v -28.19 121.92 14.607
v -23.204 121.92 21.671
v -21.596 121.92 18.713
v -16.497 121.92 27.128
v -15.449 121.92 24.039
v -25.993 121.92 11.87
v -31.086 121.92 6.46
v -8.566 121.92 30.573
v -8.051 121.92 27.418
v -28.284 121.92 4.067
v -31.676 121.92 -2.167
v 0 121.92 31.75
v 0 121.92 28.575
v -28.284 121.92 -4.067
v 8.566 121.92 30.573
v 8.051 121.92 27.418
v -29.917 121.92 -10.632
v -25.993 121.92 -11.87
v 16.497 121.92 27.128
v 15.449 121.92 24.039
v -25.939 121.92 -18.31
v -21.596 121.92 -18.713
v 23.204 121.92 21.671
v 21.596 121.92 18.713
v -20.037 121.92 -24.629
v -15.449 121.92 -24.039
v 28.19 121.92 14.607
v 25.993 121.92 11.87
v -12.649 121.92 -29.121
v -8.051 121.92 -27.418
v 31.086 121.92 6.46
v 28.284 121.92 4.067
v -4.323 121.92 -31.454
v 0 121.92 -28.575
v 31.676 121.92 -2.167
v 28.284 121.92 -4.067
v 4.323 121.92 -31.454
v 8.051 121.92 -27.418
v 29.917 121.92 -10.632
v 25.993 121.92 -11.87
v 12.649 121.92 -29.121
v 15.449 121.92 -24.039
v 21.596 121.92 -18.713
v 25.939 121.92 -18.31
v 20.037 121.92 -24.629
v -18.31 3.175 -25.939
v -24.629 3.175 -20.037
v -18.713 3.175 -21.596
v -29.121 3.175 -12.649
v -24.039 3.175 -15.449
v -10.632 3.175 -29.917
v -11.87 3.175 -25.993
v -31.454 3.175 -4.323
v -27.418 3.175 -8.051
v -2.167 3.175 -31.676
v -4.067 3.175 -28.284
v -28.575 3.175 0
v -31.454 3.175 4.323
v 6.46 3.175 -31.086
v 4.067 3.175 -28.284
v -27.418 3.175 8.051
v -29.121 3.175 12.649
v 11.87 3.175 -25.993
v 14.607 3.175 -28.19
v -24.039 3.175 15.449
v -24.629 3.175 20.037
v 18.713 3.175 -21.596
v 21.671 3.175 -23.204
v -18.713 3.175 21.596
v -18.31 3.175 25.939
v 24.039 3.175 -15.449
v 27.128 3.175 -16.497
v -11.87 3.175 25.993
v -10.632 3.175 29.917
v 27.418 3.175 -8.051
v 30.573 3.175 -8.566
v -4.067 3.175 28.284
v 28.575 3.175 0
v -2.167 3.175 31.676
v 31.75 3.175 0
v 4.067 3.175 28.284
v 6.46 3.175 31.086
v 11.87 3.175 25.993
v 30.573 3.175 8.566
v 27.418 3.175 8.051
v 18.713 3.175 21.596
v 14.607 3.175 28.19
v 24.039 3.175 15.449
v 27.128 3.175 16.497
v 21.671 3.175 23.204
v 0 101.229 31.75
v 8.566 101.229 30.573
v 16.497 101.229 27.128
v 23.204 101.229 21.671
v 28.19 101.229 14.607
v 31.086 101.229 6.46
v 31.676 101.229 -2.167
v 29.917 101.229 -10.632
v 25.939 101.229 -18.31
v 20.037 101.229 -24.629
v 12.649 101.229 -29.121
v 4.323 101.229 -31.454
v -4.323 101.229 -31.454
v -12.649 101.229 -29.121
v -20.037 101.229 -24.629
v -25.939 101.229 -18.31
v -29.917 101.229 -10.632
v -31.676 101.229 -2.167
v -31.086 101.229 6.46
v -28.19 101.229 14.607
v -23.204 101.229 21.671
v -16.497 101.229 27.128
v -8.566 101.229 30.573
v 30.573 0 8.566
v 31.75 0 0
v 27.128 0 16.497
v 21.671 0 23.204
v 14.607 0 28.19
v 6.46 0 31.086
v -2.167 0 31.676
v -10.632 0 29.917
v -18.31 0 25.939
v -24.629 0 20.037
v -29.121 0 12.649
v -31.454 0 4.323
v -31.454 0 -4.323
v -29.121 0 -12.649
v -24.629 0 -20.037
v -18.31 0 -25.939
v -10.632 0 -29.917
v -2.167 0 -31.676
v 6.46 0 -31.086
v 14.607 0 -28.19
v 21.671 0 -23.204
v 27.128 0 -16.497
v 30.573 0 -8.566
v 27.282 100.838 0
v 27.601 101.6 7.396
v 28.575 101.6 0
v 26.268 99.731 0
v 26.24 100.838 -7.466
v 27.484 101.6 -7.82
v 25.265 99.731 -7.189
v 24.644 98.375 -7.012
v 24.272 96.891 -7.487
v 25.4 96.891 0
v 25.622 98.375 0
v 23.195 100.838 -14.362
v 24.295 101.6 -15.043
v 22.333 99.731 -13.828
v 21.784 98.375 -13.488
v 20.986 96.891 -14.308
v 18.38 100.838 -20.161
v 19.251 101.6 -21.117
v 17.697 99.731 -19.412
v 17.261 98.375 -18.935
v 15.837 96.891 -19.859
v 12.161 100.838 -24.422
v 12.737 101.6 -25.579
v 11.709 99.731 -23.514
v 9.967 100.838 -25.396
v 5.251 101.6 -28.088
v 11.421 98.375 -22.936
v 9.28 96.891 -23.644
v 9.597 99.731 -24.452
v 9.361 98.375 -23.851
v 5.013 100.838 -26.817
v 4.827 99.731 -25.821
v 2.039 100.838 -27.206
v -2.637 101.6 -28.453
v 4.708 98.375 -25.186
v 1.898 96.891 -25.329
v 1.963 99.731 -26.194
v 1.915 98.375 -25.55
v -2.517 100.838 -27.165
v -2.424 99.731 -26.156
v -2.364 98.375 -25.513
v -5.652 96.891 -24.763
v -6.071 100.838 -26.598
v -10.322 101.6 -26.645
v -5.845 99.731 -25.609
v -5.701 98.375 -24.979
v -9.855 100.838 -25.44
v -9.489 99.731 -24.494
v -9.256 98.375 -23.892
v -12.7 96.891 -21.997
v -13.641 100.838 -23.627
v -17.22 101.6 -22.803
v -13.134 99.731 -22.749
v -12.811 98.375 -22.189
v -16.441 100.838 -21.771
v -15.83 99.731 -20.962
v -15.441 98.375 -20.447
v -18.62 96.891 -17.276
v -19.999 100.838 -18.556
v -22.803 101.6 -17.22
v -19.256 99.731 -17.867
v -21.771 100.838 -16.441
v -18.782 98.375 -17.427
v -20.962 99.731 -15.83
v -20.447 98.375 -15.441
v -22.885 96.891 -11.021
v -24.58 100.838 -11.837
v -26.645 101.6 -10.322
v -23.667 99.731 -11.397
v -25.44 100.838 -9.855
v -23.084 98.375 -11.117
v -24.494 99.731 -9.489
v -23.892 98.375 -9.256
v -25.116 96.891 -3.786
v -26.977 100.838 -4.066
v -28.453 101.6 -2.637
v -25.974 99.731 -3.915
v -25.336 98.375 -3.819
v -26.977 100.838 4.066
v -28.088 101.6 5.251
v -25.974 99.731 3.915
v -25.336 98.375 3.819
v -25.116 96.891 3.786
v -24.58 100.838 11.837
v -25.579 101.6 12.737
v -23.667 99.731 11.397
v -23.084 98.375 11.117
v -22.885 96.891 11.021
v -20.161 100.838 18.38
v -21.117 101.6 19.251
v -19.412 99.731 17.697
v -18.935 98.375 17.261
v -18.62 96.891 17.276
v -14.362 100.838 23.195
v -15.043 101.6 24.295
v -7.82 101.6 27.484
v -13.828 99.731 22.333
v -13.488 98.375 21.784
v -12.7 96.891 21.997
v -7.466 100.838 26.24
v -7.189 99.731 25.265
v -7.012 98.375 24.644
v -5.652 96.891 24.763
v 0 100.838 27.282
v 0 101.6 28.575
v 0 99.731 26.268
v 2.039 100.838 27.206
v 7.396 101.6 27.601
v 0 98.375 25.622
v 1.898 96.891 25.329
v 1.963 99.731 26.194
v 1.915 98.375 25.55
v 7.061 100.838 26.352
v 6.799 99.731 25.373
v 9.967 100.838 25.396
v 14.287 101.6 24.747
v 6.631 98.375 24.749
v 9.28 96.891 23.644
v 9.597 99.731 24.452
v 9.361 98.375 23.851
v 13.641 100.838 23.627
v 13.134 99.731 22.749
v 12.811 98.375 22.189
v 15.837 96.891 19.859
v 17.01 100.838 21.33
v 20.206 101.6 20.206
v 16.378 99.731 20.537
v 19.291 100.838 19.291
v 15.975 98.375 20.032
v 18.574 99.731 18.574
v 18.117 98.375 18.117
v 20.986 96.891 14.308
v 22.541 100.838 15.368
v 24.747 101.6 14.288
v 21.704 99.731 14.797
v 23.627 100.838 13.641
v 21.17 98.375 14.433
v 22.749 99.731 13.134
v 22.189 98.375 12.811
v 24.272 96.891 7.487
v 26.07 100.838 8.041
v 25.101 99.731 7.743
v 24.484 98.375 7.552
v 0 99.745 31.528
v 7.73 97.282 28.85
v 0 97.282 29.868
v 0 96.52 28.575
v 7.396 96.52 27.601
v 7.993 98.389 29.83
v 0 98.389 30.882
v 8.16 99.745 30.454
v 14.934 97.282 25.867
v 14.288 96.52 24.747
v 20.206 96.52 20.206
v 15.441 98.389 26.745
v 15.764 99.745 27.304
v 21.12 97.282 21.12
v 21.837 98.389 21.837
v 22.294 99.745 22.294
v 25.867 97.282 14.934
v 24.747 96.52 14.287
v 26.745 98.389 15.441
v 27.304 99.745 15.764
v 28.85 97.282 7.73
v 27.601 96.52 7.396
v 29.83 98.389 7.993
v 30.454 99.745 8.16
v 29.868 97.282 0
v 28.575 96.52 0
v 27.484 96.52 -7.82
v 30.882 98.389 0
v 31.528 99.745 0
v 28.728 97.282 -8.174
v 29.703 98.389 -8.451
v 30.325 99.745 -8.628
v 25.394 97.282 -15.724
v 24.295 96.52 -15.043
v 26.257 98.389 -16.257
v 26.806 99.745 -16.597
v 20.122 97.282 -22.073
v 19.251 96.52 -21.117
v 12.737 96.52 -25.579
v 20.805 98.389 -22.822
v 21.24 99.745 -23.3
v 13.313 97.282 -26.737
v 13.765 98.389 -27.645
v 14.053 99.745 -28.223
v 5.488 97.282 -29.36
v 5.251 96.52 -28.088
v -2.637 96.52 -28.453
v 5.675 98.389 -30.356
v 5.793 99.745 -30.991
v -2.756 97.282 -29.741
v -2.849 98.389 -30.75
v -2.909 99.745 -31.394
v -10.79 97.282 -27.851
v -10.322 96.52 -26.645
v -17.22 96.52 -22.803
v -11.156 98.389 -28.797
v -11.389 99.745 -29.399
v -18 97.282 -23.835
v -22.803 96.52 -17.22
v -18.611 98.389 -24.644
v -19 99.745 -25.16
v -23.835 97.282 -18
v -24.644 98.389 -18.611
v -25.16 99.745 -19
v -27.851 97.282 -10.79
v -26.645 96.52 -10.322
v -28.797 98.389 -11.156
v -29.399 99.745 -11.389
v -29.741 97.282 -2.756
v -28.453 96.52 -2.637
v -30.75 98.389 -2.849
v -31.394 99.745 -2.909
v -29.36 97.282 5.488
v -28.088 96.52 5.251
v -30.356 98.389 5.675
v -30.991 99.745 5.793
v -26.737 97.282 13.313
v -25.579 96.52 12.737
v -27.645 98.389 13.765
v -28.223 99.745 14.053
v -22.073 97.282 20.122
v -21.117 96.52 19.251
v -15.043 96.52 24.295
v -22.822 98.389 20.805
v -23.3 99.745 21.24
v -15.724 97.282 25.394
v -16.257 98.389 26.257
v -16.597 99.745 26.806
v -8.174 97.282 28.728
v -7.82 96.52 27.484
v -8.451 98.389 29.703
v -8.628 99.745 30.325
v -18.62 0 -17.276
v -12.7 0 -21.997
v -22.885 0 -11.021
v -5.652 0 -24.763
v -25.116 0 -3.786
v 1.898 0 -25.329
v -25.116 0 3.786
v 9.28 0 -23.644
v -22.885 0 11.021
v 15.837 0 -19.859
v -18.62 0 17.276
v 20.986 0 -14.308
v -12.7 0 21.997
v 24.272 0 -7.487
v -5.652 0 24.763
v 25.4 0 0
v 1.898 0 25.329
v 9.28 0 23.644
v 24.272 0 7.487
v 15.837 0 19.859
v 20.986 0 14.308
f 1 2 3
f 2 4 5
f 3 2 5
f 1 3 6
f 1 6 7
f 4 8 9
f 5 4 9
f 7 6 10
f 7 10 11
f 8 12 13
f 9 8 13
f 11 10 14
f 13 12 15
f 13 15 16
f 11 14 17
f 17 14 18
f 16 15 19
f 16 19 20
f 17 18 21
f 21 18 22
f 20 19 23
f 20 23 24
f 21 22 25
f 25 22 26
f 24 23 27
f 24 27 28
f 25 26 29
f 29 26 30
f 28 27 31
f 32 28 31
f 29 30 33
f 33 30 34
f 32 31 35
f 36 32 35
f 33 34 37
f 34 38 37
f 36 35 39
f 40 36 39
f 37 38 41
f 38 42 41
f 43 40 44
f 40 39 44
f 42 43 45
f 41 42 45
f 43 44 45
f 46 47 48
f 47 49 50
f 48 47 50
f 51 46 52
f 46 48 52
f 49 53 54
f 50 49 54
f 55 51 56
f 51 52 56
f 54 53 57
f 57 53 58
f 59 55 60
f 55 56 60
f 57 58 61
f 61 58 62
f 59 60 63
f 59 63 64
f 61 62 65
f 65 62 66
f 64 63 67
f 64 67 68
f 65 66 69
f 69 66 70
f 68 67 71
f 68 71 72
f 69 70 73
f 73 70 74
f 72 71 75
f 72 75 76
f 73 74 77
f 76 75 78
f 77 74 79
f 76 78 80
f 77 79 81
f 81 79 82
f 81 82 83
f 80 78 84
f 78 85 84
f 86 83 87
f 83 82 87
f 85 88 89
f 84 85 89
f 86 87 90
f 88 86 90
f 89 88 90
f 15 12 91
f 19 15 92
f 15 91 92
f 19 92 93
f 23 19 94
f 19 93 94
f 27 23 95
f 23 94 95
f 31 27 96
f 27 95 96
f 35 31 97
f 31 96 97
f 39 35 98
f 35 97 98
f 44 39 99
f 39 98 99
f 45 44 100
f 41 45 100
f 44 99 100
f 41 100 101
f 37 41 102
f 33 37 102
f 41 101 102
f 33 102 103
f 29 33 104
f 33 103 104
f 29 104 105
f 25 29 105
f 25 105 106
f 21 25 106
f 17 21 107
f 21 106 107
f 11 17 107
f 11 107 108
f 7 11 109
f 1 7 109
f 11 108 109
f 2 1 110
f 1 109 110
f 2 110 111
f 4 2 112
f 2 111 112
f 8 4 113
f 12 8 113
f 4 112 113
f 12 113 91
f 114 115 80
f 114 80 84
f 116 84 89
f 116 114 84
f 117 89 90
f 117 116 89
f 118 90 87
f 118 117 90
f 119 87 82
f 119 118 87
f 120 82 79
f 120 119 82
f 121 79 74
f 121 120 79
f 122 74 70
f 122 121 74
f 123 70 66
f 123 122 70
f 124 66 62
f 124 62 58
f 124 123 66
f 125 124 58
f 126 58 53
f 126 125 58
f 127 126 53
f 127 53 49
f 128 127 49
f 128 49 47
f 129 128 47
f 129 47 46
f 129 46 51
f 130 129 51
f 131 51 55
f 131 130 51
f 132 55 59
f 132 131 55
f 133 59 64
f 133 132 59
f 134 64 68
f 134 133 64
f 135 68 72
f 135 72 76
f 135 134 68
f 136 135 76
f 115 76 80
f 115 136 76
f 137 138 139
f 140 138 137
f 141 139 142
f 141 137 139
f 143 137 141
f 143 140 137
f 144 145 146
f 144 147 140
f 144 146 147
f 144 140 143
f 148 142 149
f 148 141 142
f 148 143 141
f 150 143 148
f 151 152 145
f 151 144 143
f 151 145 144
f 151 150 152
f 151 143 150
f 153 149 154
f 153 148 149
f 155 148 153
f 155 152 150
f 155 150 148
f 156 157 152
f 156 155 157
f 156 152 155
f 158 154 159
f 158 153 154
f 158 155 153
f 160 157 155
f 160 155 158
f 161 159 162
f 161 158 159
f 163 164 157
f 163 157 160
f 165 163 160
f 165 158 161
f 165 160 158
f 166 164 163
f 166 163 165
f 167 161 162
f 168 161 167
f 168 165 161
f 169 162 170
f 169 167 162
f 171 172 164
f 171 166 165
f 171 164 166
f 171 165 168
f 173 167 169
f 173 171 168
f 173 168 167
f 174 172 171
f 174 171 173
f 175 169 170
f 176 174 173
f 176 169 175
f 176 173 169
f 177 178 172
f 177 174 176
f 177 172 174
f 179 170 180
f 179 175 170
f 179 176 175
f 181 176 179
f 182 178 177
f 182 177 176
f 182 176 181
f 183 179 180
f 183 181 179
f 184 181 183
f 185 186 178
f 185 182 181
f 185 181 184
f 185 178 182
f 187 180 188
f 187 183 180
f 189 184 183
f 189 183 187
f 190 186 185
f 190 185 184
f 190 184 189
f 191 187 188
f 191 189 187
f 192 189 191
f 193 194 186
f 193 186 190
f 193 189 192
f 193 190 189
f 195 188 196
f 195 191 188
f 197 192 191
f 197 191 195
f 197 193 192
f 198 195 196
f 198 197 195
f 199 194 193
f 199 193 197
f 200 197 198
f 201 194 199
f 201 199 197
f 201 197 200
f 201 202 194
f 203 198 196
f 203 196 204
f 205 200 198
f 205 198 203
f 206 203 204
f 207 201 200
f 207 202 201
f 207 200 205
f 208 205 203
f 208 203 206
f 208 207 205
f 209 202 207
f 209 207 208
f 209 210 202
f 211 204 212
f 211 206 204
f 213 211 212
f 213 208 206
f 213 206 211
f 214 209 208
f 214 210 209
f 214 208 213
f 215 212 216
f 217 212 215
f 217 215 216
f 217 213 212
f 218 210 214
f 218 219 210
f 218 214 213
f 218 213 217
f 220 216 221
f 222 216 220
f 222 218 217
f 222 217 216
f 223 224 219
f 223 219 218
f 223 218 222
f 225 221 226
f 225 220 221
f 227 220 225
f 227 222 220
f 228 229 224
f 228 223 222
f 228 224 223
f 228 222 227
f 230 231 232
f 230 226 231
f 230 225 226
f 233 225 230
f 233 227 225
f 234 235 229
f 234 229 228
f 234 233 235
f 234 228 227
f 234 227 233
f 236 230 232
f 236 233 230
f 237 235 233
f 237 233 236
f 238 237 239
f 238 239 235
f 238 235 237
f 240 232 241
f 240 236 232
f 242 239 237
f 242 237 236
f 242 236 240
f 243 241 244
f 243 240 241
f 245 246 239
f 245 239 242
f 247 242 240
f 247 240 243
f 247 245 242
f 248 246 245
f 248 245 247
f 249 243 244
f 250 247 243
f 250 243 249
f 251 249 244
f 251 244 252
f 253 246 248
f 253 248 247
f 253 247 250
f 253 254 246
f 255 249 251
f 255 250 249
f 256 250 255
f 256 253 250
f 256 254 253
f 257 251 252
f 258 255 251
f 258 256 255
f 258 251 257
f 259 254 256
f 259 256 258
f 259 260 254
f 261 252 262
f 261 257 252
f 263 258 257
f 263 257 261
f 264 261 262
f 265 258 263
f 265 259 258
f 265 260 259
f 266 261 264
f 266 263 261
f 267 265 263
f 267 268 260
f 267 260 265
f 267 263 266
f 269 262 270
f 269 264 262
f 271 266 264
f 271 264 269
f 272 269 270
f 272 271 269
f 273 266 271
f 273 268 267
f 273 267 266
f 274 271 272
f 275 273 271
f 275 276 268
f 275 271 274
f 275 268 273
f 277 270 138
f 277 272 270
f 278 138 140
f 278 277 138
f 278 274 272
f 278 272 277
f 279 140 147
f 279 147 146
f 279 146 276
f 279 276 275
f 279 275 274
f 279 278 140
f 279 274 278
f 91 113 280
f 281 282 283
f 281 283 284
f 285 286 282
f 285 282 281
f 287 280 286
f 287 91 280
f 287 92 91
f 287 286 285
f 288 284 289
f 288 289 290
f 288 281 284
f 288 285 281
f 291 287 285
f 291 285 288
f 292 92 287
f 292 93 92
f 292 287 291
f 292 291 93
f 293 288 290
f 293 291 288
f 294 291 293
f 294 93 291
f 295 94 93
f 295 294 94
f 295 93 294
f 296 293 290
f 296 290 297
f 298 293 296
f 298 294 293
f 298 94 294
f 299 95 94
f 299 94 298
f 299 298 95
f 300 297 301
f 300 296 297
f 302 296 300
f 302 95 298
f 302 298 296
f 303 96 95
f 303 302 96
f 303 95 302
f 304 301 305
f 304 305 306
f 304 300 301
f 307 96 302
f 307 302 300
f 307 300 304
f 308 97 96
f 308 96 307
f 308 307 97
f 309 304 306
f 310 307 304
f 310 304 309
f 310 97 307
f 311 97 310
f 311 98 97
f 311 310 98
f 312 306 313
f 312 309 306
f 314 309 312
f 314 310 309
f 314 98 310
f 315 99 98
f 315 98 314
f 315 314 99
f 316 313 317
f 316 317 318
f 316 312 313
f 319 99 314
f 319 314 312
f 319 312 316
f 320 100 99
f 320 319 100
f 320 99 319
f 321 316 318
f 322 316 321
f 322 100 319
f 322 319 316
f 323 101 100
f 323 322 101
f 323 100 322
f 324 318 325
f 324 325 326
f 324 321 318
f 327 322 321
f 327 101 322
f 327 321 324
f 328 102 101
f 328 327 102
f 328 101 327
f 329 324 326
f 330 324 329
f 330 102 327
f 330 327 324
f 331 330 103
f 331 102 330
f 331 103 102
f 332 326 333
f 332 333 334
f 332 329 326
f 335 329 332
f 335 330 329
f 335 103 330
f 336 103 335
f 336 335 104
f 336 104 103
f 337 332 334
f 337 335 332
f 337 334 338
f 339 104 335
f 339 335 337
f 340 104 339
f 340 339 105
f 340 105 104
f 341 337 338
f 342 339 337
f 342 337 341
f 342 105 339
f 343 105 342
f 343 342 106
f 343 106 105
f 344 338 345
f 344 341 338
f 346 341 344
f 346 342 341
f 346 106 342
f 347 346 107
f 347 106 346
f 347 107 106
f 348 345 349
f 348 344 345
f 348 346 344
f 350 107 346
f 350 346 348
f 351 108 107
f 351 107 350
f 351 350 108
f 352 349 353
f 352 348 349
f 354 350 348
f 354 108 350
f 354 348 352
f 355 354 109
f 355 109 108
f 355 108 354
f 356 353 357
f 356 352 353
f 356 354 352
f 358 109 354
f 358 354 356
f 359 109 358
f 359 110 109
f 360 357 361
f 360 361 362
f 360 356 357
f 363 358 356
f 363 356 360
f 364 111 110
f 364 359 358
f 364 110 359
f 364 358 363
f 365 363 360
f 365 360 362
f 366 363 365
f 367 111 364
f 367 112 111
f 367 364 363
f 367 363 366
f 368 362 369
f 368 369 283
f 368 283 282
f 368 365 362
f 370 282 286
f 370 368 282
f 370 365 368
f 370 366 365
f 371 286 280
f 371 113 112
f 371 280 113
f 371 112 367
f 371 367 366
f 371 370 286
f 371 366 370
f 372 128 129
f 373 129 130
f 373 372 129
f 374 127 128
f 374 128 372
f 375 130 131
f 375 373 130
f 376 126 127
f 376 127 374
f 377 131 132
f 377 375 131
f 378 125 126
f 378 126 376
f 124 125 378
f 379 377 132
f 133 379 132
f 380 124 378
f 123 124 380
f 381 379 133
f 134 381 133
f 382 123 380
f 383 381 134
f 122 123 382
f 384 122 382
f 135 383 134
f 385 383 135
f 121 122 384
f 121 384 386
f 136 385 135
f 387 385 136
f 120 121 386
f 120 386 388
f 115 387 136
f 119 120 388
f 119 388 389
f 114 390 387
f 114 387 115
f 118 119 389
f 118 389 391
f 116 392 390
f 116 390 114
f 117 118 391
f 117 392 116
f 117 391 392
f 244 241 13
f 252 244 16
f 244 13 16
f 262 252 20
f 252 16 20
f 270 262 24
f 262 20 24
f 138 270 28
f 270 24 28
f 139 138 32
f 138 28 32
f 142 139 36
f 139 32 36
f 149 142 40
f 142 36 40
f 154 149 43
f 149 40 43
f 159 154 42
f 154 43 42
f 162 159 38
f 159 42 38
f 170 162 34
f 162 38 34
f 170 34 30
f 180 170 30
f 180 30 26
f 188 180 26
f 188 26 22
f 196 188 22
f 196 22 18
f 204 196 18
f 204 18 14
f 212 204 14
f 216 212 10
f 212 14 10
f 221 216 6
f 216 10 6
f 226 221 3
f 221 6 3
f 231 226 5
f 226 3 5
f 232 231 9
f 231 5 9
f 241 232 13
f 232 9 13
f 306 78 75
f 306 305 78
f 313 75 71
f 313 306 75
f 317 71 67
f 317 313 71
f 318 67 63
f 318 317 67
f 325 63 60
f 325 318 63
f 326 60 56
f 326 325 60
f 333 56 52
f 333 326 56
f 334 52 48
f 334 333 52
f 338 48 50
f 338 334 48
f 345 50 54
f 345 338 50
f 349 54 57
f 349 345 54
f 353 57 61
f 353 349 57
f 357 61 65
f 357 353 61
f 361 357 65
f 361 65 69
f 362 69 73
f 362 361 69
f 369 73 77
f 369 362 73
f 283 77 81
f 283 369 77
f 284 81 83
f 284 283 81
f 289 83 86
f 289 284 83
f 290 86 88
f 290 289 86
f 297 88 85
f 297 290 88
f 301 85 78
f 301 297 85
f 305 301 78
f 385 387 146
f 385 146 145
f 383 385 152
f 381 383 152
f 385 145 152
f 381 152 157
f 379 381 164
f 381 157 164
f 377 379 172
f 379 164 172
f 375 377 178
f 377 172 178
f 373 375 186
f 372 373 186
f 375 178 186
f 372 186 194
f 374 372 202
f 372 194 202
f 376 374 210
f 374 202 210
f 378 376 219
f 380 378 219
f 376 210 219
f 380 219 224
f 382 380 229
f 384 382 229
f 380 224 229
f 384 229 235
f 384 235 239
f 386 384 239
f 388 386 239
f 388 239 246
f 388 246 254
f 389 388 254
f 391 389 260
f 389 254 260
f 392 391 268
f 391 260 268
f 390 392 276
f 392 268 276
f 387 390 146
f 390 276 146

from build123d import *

# Parameters (mm, degrees)
F0_R     = 28.575
F0_R_2   = 25.4
F0_R_3   = 31.75
F3_DEPTH = 3.175


# Not quite as in the source:
# - a fillet or chamfer that OpenCascade refuses, or shapes differently, is made with other operations: its cross-section is extruded or revolved along the edge and cut away or added


with BuildPart() as f2:
    # F2: sweep along a path in F1
    with BuildLine(Plane.YZ) as f2_path:
        Line((0, 0), (101.6, 0))
    # F0 (on Front) → F2 (sweep)
    with BuildSketch(Plane.XZ):
        Circle(F0_R)
        Circle(F0_R_2, mode=Mode.SUBTRACT)
    sweep(path=f2_path.line)

    # F0 (on Front) → F3 (join)
    with BuildSketch(Plane.XZ):
        Circle(F0_R_3)
        Circle(F0_R, mode=Mode.SUBTRACT)
    extrude(amount=-F3_DEPTH)

    # F1 (on Right) → F4 (revolve)
    with BuildSketch(Plane.YZ):
        Polygon((96.52, 28.575), (101.6, 28.575), (121.92, 28.575), (121.92, 31.75), (96.52, 31.75), align=None)
    revolve(axis=Axis((0, 50.8, 0), (0, 1, 0)))

    # F5: fillet of radius 5.08 on 2 edges, made by hand

    # F5_s1 → F5_t2 (revolve, cut)
    with BuildSketch(Plane.XY):
        with BuildLine():
            ThreePointArc((28.575, 101.6), (26.2678865162, 99.7305202921), (25.4, 96.8907139607))
            Line((25.4, 96.8907139607), (25.4, 101.6))
            Line((25.4, 101.6), (28.575, 101.6))
        make_face()
    revolve(axis=Axis((0, 101.6, 0), (0, 1, 0)), mode=Mode.SUBTRACT)

    # F5_s3 → F5_t4 (revolve, cut)
    with BuildSketch(Plane.YZ):
        with BuildLine():
            ThreePointArc((96.52, 28.575), (98.3894797079, 30.8821134838), (101.2292860393, 31.75))
            Line((101.2292860393, 31.75), (96.52, 31.75))
            Line((96.52, 31.75), (96.52, 28.575))
        make_face()
    revolve(axis=Axis((0, 96.52, 0), (0, 1, 0)), mode=Mode.SUBTRACT)


solid = f2.part
